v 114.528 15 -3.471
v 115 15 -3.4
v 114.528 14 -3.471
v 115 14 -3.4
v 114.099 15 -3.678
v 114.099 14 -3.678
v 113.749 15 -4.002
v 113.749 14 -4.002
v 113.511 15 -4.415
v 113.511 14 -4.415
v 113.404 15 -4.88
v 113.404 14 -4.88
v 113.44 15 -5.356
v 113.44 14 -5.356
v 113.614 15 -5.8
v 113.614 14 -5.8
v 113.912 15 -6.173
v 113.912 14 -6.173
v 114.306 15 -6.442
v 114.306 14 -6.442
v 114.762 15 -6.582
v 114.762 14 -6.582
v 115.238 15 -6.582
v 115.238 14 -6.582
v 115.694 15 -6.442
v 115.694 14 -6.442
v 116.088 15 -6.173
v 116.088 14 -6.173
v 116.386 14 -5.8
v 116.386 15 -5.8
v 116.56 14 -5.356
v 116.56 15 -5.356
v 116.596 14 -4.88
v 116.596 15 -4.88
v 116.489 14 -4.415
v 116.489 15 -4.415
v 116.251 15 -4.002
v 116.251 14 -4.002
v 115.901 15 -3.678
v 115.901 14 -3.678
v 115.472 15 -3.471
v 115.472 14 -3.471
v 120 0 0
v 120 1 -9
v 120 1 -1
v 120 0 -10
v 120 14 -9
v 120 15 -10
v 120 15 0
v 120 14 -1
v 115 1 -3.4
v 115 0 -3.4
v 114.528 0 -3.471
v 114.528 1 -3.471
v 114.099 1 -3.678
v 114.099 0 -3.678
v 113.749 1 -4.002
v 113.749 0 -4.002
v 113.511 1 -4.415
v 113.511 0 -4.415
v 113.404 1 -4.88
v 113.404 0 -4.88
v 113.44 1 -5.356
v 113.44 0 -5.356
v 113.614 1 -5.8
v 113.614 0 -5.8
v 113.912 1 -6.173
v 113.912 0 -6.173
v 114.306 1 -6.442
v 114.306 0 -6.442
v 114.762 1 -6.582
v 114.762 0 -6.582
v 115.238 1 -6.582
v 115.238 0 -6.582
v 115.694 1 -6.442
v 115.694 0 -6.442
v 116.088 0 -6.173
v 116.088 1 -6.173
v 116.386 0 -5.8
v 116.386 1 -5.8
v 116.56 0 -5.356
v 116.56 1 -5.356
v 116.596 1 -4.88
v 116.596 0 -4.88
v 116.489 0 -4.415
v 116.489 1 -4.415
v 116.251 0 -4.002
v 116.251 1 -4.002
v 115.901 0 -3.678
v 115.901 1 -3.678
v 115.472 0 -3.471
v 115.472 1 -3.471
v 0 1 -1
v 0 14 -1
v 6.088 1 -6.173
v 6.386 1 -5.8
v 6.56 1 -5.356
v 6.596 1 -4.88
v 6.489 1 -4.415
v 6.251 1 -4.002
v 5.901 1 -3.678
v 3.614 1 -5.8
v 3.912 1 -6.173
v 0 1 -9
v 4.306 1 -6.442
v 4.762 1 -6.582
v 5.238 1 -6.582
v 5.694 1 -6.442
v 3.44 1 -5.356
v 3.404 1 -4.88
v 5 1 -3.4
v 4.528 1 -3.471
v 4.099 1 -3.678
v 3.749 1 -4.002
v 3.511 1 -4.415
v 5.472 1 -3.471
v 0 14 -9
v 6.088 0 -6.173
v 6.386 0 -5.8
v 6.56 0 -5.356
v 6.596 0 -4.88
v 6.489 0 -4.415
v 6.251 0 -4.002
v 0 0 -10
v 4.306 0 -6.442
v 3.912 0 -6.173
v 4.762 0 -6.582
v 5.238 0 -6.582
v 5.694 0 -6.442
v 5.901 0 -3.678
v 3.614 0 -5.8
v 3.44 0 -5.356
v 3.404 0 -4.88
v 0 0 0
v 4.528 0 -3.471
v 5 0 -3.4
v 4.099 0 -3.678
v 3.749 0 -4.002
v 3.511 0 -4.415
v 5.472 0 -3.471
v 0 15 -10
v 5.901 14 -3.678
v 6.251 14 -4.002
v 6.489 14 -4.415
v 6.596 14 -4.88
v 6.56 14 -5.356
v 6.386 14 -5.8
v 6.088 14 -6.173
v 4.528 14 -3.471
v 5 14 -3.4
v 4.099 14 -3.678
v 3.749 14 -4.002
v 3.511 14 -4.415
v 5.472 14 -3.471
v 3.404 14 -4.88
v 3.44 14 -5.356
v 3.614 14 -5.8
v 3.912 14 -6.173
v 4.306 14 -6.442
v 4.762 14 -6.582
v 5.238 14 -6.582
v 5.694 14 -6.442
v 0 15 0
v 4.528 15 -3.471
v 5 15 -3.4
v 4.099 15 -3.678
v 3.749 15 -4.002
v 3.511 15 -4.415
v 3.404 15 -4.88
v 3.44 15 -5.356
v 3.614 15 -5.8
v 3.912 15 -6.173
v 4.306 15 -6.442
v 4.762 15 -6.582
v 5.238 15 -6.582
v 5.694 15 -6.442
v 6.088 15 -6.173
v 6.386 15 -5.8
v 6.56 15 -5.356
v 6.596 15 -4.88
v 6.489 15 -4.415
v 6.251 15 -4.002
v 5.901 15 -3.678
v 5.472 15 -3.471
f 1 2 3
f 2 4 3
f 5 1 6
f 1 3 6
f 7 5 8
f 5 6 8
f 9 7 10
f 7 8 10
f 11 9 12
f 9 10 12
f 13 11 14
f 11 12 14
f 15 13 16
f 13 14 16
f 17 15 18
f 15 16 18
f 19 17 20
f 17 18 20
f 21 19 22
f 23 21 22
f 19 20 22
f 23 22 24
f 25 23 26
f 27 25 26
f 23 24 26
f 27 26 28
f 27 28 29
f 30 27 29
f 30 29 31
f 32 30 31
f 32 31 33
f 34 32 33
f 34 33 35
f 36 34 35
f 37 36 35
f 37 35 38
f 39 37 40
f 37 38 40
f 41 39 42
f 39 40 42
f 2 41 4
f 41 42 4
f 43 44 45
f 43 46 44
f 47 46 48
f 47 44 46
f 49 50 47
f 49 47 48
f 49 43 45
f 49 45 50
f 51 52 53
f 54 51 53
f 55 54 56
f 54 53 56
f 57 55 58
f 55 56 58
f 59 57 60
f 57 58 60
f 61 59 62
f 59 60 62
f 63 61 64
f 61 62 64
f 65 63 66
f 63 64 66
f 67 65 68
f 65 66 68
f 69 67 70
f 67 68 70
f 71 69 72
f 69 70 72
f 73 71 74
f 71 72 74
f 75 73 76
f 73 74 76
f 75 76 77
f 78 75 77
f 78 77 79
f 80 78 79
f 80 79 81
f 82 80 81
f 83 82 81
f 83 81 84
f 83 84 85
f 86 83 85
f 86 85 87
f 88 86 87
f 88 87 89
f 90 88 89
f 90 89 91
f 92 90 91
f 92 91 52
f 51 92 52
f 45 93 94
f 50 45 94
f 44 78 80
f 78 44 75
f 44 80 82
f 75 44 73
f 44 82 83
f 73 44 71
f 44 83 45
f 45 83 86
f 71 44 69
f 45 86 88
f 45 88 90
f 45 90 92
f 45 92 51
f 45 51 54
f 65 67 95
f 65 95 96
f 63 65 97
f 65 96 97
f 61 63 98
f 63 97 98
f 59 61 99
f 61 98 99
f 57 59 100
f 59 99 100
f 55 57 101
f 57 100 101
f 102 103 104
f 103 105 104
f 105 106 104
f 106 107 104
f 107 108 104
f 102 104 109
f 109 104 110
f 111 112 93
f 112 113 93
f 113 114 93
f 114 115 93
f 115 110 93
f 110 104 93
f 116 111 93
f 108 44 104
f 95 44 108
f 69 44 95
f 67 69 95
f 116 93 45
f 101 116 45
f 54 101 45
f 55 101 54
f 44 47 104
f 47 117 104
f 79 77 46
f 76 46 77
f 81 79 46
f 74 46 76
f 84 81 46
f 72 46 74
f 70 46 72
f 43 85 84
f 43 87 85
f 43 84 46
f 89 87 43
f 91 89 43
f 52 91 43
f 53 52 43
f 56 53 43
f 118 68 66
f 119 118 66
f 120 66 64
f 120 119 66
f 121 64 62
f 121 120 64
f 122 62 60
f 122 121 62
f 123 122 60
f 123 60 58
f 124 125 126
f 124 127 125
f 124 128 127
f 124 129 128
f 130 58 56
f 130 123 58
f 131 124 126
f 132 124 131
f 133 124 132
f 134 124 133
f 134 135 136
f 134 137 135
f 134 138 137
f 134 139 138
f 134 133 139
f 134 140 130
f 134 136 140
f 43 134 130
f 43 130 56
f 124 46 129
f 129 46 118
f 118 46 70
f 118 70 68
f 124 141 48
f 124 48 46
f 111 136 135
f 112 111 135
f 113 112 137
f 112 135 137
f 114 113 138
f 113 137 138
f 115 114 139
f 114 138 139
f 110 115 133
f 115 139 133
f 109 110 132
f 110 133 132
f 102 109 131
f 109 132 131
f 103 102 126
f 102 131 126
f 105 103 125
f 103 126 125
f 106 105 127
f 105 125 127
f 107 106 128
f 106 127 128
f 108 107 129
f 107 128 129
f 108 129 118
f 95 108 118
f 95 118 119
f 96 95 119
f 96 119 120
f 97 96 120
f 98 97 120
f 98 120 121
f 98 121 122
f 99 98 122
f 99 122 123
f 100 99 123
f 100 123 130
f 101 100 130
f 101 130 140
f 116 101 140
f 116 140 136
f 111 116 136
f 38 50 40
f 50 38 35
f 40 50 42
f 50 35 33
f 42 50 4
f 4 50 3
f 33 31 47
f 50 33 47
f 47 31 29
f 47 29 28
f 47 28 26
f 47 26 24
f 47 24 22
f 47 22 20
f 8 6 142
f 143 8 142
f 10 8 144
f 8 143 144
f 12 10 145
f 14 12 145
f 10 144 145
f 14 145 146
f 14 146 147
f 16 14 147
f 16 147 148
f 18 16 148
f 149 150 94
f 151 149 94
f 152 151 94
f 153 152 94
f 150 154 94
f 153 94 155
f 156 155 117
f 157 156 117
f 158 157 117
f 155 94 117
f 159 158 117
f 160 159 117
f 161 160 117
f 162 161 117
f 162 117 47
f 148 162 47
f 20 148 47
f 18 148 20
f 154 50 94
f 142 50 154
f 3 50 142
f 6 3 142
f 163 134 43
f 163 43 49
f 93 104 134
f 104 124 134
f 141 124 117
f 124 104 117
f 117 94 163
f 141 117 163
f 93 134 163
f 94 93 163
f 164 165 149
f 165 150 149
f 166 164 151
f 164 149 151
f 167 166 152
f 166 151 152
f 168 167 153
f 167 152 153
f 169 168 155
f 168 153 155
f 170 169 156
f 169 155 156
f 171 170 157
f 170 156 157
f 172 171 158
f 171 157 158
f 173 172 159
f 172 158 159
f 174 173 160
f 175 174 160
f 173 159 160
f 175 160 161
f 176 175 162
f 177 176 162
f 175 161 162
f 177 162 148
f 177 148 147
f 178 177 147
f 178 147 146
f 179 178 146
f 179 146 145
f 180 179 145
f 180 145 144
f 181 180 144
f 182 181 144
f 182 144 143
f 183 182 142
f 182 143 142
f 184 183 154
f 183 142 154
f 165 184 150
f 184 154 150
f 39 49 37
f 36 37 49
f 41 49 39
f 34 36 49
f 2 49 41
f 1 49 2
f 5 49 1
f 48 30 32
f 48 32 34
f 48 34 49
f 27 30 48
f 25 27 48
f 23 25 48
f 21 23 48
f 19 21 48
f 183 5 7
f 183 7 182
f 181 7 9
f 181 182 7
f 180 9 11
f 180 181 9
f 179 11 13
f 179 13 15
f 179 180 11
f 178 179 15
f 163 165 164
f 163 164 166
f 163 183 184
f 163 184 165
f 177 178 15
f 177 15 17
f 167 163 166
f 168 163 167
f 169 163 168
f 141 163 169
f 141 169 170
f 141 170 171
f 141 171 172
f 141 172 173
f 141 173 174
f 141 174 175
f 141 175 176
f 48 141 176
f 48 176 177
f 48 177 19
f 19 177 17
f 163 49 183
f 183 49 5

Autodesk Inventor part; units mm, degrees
ref_plane "YZ Plane" through (0, 0, 0) normal (1, 0, 0) x (0, 1, 0)
ref_plane "XZ Plane" through (0, 0, 0) normal (0, 1, 0) x (-1, 0, 0)
ref_plane "XY Plane" through (0, 0, 0) normal (0, 0, 1) x (1, 0, 0)
sketch "スケッチ1" plane through (0, 0, 0) normal (1, 0, 0) x (0, 1, 0)
  line L0 (0, 0) -> (15, 0)
  line L1 (15, 0) -> (15, -10)
  line L2 (15, -10) -> (0, -10)
  line L3 (0, -10) -> (0, 0)
  line L4 (1, -1) -> (14, -1)
  line L5 (14, -1) -> (14, -9)
  line L6 (14, -9) -> (1, -9)
  line L7 (1, -9) -> (1, -1)
  dimension "d0" = 15
  dimension "d1" = 10
  dimension "d2" = 13
  dimension "d3" = 8
  dimension "d4" = 1
  dimension "d5" = 1
extrude "押し出し1" add sketch "スケッチ1" along normal blind 120
sketch "スケッチ2" plane through (0, 15, 0) normal (0, 1, 0) x (1, 0, 0)
  line L0 (0, 9) -> (0, 1) projected
  line L1 (0, 5) -> (120, 5)
  line L2 (120, 10) -> (120, 0) projected
  point P0 (0, 0)
  point P1 (5, 5)
  point P2 (115, 5)
  dimension "d8" = 5
  dimension "d9" = 5
hole "穴1" at (5, 15, -5) at (115, 15, -5) direction (0, -1, 0) diameter 3.2 end through all
properties part number "base_pipe1" material "アルミニウム 6061"
